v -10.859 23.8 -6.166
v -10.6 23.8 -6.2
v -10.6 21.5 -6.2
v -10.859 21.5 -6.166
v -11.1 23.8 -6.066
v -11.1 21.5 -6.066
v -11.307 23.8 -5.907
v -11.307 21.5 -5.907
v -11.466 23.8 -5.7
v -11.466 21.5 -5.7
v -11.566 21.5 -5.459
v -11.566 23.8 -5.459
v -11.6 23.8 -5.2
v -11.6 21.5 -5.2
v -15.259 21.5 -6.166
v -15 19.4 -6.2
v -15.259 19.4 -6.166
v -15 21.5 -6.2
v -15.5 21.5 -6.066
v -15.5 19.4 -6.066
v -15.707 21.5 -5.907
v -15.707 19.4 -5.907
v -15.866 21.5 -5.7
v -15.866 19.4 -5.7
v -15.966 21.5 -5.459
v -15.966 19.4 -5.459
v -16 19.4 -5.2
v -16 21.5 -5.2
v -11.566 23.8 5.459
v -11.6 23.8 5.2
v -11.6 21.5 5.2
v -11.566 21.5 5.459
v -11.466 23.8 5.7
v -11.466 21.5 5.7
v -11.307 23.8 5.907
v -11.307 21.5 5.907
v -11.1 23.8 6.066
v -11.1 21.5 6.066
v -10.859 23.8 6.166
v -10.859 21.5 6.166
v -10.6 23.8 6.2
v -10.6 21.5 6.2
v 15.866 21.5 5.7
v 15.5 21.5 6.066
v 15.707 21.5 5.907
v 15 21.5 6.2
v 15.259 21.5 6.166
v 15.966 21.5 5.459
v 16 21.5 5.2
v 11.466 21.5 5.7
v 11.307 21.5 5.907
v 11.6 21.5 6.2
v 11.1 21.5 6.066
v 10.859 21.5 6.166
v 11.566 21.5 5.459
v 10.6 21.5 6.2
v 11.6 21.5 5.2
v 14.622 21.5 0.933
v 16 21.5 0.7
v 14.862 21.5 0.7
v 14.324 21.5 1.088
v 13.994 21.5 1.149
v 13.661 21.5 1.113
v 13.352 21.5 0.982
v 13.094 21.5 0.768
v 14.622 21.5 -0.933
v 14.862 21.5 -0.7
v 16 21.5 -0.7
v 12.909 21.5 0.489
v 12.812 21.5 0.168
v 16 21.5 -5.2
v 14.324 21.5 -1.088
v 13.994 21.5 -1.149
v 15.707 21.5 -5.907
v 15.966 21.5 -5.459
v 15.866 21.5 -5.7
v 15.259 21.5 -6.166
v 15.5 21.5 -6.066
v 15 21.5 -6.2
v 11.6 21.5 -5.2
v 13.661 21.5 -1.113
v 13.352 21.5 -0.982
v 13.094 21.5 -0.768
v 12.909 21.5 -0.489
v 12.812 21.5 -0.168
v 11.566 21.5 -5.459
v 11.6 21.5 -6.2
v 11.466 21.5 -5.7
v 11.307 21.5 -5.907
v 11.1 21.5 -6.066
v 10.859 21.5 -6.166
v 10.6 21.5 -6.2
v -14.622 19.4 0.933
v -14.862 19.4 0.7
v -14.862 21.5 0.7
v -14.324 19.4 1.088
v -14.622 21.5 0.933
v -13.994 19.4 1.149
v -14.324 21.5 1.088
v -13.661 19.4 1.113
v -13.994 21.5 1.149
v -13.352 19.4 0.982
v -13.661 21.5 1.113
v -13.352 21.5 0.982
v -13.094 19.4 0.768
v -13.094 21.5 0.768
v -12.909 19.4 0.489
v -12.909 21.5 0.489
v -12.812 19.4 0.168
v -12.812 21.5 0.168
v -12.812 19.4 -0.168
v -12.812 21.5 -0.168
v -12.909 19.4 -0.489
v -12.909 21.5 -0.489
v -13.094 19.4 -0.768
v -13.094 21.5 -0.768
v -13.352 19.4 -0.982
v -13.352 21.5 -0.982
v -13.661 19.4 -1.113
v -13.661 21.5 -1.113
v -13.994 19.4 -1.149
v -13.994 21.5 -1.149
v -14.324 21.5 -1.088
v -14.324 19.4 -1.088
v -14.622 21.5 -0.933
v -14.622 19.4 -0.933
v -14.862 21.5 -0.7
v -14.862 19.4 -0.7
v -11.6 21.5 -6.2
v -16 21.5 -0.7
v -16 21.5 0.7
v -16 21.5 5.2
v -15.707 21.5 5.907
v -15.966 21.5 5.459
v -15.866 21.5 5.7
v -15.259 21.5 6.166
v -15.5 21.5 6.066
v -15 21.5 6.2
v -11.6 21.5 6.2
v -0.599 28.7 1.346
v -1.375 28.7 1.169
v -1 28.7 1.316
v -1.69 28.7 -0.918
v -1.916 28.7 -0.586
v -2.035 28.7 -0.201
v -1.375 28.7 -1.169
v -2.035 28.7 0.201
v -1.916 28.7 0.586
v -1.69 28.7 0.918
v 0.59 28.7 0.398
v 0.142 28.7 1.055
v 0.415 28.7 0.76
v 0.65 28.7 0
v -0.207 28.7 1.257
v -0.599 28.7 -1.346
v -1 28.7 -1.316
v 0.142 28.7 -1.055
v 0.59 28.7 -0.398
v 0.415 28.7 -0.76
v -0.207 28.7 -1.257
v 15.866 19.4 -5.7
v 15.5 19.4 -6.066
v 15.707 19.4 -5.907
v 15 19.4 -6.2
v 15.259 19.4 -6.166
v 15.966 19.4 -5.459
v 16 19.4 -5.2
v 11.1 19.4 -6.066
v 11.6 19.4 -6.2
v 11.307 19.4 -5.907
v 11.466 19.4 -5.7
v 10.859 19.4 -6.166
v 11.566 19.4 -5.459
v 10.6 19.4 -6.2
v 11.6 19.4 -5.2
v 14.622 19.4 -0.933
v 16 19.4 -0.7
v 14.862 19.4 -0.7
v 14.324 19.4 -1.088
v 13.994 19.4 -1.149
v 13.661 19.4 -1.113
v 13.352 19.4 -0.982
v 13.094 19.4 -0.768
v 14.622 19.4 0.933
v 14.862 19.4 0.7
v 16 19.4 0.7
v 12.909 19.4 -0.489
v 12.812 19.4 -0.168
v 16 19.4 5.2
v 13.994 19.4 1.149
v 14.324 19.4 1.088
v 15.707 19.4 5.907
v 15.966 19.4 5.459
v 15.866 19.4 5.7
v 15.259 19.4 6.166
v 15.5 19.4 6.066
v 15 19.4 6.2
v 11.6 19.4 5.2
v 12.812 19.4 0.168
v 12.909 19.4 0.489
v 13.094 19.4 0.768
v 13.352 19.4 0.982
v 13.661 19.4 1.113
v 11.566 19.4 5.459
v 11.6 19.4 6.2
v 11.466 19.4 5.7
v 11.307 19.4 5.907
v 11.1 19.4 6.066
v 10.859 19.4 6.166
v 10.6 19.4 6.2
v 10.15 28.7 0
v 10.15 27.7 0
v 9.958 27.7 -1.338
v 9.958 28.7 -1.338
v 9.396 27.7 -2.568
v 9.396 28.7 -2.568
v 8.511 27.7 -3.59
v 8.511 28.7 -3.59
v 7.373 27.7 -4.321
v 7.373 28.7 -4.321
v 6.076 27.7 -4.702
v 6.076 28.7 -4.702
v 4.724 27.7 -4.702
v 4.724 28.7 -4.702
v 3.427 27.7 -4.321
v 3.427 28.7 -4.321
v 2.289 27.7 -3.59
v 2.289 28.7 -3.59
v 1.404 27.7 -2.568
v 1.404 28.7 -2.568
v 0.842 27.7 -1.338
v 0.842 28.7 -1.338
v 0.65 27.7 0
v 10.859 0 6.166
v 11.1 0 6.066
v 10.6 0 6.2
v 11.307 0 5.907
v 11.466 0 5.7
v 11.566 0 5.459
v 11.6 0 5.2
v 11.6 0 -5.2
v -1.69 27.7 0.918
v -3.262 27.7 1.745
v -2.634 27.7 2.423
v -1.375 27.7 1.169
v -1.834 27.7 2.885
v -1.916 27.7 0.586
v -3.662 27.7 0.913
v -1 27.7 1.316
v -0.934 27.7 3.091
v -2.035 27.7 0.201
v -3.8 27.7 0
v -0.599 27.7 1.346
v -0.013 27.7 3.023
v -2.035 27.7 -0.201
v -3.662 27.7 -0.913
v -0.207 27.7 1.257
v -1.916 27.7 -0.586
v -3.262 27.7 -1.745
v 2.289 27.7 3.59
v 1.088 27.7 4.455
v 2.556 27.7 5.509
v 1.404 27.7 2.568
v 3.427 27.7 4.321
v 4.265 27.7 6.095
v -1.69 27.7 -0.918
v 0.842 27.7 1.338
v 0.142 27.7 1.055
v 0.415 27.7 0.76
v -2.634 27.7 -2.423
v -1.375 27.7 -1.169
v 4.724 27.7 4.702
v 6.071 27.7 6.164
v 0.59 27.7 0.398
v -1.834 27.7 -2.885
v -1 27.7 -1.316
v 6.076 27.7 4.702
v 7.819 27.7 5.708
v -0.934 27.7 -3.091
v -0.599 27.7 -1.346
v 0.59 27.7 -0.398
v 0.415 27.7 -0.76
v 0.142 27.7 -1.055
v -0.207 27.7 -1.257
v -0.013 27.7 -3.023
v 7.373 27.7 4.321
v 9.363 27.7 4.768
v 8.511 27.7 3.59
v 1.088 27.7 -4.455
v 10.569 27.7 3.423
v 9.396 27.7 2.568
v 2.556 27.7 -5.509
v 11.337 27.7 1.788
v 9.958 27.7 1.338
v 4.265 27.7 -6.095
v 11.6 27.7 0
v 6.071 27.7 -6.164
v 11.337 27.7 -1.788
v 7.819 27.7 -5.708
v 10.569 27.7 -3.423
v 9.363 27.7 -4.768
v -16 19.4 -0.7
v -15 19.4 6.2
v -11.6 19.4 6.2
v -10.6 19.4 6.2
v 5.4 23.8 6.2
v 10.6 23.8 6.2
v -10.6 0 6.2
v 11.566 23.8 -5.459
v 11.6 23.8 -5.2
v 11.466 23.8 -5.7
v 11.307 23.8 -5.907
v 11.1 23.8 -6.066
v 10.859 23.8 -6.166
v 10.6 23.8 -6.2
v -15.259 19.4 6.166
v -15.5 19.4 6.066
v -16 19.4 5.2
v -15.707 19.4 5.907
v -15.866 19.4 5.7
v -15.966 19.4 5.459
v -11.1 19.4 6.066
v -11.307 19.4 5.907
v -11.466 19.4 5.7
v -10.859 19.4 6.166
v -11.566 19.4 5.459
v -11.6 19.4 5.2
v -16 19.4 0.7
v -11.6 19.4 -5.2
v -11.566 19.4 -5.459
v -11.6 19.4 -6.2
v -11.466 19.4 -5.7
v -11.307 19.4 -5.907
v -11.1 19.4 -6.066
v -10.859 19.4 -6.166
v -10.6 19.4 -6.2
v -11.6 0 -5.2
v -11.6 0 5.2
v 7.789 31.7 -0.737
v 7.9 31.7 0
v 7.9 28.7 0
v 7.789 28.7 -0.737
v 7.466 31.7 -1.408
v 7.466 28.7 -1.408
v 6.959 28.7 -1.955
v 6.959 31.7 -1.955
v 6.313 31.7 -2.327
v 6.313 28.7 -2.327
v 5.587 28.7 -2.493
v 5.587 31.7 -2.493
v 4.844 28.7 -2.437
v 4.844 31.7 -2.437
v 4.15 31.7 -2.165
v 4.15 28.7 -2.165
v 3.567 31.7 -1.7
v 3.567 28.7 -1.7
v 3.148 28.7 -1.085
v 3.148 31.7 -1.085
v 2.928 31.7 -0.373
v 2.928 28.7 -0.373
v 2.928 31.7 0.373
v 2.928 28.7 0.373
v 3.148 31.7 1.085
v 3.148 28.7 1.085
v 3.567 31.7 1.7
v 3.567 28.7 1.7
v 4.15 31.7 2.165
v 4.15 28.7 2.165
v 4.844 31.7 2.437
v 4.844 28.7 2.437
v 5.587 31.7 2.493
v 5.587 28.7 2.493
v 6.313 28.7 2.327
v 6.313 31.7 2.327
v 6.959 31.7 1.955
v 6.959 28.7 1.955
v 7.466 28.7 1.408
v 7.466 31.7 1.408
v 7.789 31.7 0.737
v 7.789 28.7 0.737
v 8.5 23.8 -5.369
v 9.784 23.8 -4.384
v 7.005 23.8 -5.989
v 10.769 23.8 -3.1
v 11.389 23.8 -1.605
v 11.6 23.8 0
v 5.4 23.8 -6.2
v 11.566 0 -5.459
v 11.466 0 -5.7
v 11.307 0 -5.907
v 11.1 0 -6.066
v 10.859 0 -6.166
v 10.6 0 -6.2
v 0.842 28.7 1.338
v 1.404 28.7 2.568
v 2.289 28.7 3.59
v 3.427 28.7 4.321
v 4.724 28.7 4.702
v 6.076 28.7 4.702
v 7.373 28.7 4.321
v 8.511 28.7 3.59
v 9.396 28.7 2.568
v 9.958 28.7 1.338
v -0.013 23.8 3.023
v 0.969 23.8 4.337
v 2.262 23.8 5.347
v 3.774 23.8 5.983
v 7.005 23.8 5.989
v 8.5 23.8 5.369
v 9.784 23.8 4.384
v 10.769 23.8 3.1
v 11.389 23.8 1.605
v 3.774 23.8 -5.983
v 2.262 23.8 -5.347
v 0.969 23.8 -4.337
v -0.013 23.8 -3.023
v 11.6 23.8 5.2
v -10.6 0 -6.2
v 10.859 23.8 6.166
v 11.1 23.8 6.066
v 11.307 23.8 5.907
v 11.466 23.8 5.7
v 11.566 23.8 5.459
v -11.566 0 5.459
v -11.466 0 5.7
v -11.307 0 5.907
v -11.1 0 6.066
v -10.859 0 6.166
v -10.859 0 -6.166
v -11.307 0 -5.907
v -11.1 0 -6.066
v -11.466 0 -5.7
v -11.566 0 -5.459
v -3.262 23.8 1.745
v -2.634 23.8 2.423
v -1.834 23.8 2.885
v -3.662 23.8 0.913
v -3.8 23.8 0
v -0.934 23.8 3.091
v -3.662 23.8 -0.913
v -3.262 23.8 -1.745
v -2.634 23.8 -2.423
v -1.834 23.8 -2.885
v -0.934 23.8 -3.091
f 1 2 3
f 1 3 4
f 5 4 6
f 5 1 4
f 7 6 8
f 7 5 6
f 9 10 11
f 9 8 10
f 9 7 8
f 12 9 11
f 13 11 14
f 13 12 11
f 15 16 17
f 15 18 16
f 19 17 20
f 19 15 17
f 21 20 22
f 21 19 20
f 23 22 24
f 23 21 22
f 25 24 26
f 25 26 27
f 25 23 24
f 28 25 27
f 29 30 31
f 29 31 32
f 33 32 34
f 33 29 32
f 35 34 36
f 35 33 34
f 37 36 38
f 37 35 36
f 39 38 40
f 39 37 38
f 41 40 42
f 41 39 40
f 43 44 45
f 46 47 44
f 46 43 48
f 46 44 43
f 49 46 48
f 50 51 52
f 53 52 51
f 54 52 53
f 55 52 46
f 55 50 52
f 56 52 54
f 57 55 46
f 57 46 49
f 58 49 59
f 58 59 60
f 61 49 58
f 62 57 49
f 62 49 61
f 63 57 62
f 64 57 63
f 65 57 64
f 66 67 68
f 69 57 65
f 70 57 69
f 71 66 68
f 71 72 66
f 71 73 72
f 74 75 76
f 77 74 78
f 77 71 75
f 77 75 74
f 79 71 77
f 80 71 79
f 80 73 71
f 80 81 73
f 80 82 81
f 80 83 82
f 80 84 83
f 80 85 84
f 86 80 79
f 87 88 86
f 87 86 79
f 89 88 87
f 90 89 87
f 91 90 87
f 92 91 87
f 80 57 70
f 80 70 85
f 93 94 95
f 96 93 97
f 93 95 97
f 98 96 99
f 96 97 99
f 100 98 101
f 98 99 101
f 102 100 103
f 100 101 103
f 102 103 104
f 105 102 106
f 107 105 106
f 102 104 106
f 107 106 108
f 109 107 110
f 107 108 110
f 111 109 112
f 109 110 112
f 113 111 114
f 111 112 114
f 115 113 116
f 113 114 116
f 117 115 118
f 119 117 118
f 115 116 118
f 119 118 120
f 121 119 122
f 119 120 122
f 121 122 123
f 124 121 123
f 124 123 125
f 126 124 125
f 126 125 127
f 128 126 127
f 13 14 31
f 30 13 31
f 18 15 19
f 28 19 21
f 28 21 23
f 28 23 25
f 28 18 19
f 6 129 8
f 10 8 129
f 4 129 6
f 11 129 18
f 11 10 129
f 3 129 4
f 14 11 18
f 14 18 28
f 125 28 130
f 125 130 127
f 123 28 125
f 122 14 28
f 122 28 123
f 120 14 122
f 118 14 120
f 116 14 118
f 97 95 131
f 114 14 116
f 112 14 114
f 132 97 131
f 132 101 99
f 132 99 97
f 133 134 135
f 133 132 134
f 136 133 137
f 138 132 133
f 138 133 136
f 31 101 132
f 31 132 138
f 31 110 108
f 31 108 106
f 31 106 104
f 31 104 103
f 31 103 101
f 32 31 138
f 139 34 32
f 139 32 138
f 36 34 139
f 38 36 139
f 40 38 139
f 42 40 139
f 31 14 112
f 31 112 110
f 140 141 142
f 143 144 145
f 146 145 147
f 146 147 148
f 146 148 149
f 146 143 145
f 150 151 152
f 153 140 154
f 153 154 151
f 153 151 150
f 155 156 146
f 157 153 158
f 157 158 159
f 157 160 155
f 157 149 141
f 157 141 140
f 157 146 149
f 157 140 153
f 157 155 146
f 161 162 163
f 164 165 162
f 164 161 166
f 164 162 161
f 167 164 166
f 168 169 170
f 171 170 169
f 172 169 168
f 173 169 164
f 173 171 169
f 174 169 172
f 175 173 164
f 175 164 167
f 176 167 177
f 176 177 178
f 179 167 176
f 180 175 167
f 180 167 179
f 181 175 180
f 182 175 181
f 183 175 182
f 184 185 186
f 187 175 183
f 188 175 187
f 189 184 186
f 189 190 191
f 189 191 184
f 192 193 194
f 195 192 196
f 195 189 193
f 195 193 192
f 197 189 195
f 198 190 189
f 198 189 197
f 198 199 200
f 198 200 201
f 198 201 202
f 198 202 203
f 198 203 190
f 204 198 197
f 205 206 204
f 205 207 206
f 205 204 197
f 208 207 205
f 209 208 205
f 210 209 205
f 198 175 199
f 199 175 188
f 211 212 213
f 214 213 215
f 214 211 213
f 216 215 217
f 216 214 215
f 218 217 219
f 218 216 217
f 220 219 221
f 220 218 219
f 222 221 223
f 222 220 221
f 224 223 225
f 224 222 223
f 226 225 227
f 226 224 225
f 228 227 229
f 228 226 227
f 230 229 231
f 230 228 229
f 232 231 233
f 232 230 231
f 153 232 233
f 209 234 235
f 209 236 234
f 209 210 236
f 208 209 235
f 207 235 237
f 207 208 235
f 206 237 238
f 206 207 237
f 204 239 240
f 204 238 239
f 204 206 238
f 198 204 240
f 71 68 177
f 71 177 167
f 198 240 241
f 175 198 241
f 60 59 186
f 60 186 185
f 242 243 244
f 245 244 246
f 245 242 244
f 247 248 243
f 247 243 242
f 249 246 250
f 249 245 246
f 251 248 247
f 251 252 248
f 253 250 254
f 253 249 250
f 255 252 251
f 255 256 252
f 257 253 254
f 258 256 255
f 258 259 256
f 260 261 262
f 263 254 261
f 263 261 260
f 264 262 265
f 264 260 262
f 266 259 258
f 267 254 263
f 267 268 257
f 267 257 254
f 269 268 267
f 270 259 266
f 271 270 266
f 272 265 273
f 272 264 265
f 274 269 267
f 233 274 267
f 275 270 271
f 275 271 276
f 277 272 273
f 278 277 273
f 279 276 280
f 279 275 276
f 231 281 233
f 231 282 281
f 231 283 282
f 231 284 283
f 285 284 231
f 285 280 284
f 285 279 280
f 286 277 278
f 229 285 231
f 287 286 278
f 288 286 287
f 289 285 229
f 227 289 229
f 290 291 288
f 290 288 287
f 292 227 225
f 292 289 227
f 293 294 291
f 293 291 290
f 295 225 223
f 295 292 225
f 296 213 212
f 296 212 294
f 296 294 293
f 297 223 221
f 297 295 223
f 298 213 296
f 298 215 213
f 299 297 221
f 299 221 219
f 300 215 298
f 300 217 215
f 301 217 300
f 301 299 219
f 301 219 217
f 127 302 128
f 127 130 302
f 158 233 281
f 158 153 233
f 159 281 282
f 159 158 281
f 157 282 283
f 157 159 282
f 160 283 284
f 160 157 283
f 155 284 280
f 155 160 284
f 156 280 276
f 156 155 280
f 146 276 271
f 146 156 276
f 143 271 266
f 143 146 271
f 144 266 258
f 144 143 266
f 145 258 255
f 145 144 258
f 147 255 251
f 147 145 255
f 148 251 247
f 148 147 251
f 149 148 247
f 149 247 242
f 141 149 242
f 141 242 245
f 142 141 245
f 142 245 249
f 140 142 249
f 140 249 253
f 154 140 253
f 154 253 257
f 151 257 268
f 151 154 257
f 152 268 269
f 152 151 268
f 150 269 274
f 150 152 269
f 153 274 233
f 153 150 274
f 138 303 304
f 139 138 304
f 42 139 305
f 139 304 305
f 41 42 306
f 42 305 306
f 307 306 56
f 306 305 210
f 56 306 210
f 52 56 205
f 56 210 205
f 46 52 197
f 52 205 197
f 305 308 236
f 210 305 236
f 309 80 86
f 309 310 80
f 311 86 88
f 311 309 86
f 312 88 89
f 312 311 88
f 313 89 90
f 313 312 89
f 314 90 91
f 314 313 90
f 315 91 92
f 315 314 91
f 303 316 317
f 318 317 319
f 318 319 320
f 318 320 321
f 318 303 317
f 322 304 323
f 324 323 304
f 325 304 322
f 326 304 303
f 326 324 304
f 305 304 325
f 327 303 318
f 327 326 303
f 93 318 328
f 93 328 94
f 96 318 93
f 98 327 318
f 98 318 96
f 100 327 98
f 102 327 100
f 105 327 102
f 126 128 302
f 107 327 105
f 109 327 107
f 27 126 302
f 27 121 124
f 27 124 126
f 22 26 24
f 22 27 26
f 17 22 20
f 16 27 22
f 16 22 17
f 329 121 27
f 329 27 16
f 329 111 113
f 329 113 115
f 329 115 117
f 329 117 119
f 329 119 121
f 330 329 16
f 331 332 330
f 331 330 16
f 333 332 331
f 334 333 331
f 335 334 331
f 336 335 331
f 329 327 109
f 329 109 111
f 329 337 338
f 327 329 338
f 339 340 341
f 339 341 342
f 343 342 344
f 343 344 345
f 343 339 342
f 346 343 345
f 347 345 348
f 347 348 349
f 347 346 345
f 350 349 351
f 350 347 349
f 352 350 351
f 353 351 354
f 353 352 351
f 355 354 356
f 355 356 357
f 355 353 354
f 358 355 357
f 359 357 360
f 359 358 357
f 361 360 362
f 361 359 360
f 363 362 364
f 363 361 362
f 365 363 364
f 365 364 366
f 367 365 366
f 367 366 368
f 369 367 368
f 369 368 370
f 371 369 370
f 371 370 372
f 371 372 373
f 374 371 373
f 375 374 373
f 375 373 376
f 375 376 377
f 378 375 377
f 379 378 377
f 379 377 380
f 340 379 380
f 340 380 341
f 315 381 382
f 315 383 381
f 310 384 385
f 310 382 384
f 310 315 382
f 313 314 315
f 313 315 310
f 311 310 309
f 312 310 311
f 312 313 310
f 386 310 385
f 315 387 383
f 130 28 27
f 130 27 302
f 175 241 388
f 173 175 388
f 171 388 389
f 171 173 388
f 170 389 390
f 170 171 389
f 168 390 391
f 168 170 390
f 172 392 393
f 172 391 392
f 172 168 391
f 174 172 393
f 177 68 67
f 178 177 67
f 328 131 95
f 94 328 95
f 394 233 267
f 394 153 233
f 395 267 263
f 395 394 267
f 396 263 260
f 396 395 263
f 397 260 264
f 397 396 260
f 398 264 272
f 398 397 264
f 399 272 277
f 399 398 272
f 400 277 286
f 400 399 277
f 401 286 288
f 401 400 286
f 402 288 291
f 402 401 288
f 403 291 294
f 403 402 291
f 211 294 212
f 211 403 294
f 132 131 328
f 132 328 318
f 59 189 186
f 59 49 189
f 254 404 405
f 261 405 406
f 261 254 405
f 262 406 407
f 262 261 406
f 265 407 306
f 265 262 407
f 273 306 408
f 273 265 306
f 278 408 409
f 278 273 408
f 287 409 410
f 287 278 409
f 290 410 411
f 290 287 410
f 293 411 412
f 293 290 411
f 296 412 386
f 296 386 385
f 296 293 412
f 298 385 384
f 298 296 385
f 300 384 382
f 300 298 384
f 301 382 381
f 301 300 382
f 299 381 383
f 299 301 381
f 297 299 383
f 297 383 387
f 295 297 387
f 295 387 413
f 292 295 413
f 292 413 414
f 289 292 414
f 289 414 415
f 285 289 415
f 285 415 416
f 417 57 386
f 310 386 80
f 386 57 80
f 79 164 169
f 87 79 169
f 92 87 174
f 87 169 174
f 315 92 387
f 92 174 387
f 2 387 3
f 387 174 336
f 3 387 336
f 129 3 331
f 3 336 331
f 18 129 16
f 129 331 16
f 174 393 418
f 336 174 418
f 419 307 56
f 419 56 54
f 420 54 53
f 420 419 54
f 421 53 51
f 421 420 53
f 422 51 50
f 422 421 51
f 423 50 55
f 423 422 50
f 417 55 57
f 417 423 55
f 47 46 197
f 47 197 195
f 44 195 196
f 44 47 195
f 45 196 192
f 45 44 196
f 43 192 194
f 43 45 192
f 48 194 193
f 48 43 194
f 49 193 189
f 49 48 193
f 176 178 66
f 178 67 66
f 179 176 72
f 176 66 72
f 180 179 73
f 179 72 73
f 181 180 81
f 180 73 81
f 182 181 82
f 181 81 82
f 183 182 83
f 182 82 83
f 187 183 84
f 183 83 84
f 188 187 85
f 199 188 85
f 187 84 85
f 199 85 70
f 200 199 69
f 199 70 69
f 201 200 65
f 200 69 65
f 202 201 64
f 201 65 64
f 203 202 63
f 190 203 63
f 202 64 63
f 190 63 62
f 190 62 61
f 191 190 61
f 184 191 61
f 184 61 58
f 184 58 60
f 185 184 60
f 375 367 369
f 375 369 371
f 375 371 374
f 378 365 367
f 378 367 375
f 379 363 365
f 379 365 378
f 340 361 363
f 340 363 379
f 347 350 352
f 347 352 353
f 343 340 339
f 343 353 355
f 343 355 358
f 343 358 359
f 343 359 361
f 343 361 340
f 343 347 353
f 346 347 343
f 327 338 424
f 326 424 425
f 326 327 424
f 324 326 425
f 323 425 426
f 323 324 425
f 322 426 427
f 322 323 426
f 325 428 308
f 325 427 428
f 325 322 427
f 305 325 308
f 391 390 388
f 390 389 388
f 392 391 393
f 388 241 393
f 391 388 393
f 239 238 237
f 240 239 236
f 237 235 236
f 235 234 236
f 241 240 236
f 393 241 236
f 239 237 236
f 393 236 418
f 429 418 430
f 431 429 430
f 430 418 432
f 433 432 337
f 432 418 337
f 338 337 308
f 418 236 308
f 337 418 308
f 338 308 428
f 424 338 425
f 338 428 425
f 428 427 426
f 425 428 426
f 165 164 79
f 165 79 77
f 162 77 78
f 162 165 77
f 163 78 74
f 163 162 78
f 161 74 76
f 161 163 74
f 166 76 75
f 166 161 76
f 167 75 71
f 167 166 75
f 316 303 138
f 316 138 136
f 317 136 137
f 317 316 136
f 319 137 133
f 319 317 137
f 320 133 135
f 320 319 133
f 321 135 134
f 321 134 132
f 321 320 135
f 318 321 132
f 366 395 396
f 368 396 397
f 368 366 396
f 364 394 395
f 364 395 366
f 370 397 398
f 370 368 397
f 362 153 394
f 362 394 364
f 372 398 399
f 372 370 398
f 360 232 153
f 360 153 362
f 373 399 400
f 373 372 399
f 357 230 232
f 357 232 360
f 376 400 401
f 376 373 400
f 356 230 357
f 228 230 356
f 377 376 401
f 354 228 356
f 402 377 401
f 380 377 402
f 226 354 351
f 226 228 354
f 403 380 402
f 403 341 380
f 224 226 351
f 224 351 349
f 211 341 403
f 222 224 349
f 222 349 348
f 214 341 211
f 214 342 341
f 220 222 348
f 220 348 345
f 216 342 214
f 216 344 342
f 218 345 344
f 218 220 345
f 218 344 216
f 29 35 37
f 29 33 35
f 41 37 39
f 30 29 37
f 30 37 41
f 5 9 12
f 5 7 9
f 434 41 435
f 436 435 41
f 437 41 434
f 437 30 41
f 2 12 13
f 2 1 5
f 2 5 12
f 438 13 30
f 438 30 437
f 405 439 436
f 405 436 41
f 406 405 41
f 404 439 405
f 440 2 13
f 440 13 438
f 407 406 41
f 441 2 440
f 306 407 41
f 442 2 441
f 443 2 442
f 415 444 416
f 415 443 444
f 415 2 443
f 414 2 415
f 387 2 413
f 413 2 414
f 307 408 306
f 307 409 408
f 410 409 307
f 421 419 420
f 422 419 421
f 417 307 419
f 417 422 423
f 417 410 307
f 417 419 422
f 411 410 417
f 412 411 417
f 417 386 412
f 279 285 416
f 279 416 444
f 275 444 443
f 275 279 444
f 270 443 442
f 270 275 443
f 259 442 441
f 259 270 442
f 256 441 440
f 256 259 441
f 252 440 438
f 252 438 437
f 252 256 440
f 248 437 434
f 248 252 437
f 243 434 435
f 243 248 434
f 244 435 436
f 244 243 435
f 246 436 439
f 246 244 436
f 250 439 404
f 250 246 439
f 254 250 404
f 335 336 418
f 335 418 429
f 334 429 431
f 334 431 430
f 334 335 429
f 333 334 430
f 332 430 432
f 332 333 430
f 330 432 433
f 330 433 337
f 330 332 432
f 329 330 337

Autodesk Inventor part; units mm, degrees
ref_plane "YZ Plane" through (0, 0, 0) normal (1, 0, 0) x (0, 1, 0)
ref_plane "XZ Plane" through (0, 0, 0) normal (0, 1, 0) x (-1, 0, 0)
ref_plane "XY Plane" through (0, 0, 0) normal (0, 0, 1) x (1, 0, 0)
sketch "Sketch1" plane through (0, 0, 0) normal (0, 1, 0) x (-1, 0, 0)
  line L0 (-11.6, -6.2) -> (11.6, -6.2)
  line L1 (11.6, -6.2) -> (11.6, 6.2)
  line L2 (11.6, 6.2) -> (-11.6, 6.2)
  line L3 (-11.6, 6.2) -> (-11.6, -6.2)
  line L4 (-11.6, -6.2) -> (11.6, 6.2) construction
  line L5 (11.6, -6.2) -> (-11.6, 6.2) construction
  point P0 (0, 0)
extrude "Extrusion1" add sketch "Sketch1" along normal blind 31.7
sketch "Sketch2" plane through (11.6, 0, 6.2) normal (1, 0, 0) x (0, 0, -1)
  line L0 (12.4, 19.4) -> (0, 19.4)
  line L1 (0, 19.4) -> (0, 21.5)
  line L2 (0, 21.5) -> (12.4, 21.5)
  line L3 (12.4, 21.5) -> (12.4, 19.4)
extrude "Extrusion2" add sketch "Sketch2" along normal blind 4.4
sketch "Sketch8" plane through (-11.6, 0, -6.2) normal (-1, 0, 0) x (0, 0, 1)
  line L0 (12.4, 19.4) -> (0, 19.4)
  line L1 (0, 19.4) -> (0, 21.5)
  line L2 (0, 21.5) -> (12.4, 21.5)
  line L3 (12.4, 21.5) -> (12.4, 19.4)
  point P0 (12.4, 0)
  point P1 (6.2, 0)
extrude "Extrusion3" add sketch "Sketch8" along normal blind 4.4
sketch "Sketch10" plane through (0, 31.7, 0) normal (0, 1, 0) x (1, 0, 0)
  circle A0 centre (5.4, 0) radius 6.2
sketch "Sketch11" plane through (0, 31.7, 0) normal (0, 1, 0) x (1, 0, 0)
  circle A0 centre (-0.7, 0) radius 3.1
  point P0 (0, 0)
sketch "Sketch12" plane through (0, 31.7, 0) normal (0, 1, 0) x (1, 0, 0)
  line L0 (11.6, 6.2) -> (-11.6, 6.2) projected
  line L1 (-11.6, 6.2) -> (-11.6, -6.2) projected
  line L2 (-11.6, -6.2) -> (11.6, -6.2) projected
  line L3 (11.6, -6.2) -> (11.6, 6.2) projected
  point P0 (0, 0)
extrude "Extrusion4" cut sketch "Sketch12" against normal blind 7.9
extrude "Extrusion5" add sketch "Sketch10" against normal blind 7.9
extrude "Extrusion6" add sketch "Sketch11" against normal blind 7.9
sketch "Sketch13" plane through (0, 31.7, 0) normal (0, 1, 0) x (1, 0, 0)
  arc A0 (-0.0131, -3.0229) -> (-0.0131, 3.0229) centre (5.4, 0) ccw projected
  arc A1 (-0.0131, 3.0229) -> (-0.0131, -3.0229) centre (-0.7, 0) ccw projected
  circle A2 centre (5.4, 0) radius 4.75
  circle A3 centre (-0.7, 0) radius 1.35
extrude "Extrusion7" cut sketch "Sketch13" against normal blind 4
sketch "Sketch14" plane through (5.4, 31.7, 0) normal (0, 1, 0) x (1, 0, 0)
  circle A0 centre (0, 0) radius 4.75 projected
  circle A1 centre (0, 0) radius 2.5
  point P0 (-4.75, 0)
  point P1 (-5.4, 0)
  dimension "d28" = 5
extrude "Extrusion8" cut sketch "Sketch14" against normal blind 3
sketch "Sketch15" plane through (-0.7, 31.7, 0) normal (0, 1, 0) x (1, 0, 0)
  circle A0 centre (0, 0) radius 1.35 projected
extrude "Extrusion9" cut sketch "Sketch15" against normal blind 3
sketch "Sketch16" plane through (11.6, 21.5, 6.2) normal (0, 1, 0) x (1, 0, 0)
  circle A0 centre (2.35, 6.2) radius 1.15
  line L0 (4.4, 6.2) -> (4.4, 5.5)
  line L1 (4.4, 5.5) -> (3.2624, 5.5)
  line L2 (4.4, 6.2) -> (4.4, 6.9)
  line L3 (4.4, 6.9) -> (3.2624, 6.9)
  point P0 (-11.6, 6.2)
sketch "Sketch17" plane through (-11.6, 21.5, 6.2) normal (0, 1, 0) x (1, 0, 0)
  circle A0 centre (-2.35, 6.2) radius 1.15
  line L0 (-4.4, 6.2) -> (-4.4, 6.9)
  line L1 (-4.4, 6.9) -> (-3.2624, 6.9)
  line L2 (-4.4, 6.2) -> (-4.4, 5.5)
  line L3 (-4.4, 5.5) -> (-3.2624, 5.5)
  point P0 (11.6, 6.2)
sketch "Sketch18" plane through (-11.6, 21.5, 6.2) normal (0, 1, 0) x (1, 0, 0)
  point P0 (11.6, 6.2)
extrude "Extrusion10" cut sketch "Sketch17" against normal blind 3
extrude "Extrusion11" cut sketch "Sketch16" against normal blind 3
fillet "Fillet1" radius 1 1 edges at (-16, 20.45, -6.2)
sketch "Sketch20" plane through (-11.6, 21.5, 6.2) normal (0, 1, 0) x (1, 0, 0)
  point P0 (11.6, 6.2)
fillet "Fillet2" radius 1 1 edges at (16, 20.45, -6.2)
fillet "Fillet3" radius 1 1 edges at (-16, 20.45, 6.2)
fillet "Fillet4" radius 1 1 edges at (16, 20.45, 6.2)
fillet "Fillet5" radius 1 1 edges at (11.6, 22.65, 6.2)
fillet "Fillet6" radius 1 1 edges at (11.6, 22.65, -6.2)
fillet "Fillet7" radius 1 1 edges at (-11.6, 22.65, 6.2)
fillet "Fillet8" radius 1 1 edges at (-11.6, 22.65, -6.2)
fillet "Fillet9" radius 1 1 edges at (-11.6, 9.7, -6.2)
fillet "Fillet10" radius 1 1 edges at (11.6, 9.7, -6.2)
fillet "Fillet11" radius 1 1 edges at (11.6, 9.7, 6.2)
fillet "Fillet12" radius 1 1 edges at (-11.6, 9.7, 6.2)
properties part number "micro_servo"
